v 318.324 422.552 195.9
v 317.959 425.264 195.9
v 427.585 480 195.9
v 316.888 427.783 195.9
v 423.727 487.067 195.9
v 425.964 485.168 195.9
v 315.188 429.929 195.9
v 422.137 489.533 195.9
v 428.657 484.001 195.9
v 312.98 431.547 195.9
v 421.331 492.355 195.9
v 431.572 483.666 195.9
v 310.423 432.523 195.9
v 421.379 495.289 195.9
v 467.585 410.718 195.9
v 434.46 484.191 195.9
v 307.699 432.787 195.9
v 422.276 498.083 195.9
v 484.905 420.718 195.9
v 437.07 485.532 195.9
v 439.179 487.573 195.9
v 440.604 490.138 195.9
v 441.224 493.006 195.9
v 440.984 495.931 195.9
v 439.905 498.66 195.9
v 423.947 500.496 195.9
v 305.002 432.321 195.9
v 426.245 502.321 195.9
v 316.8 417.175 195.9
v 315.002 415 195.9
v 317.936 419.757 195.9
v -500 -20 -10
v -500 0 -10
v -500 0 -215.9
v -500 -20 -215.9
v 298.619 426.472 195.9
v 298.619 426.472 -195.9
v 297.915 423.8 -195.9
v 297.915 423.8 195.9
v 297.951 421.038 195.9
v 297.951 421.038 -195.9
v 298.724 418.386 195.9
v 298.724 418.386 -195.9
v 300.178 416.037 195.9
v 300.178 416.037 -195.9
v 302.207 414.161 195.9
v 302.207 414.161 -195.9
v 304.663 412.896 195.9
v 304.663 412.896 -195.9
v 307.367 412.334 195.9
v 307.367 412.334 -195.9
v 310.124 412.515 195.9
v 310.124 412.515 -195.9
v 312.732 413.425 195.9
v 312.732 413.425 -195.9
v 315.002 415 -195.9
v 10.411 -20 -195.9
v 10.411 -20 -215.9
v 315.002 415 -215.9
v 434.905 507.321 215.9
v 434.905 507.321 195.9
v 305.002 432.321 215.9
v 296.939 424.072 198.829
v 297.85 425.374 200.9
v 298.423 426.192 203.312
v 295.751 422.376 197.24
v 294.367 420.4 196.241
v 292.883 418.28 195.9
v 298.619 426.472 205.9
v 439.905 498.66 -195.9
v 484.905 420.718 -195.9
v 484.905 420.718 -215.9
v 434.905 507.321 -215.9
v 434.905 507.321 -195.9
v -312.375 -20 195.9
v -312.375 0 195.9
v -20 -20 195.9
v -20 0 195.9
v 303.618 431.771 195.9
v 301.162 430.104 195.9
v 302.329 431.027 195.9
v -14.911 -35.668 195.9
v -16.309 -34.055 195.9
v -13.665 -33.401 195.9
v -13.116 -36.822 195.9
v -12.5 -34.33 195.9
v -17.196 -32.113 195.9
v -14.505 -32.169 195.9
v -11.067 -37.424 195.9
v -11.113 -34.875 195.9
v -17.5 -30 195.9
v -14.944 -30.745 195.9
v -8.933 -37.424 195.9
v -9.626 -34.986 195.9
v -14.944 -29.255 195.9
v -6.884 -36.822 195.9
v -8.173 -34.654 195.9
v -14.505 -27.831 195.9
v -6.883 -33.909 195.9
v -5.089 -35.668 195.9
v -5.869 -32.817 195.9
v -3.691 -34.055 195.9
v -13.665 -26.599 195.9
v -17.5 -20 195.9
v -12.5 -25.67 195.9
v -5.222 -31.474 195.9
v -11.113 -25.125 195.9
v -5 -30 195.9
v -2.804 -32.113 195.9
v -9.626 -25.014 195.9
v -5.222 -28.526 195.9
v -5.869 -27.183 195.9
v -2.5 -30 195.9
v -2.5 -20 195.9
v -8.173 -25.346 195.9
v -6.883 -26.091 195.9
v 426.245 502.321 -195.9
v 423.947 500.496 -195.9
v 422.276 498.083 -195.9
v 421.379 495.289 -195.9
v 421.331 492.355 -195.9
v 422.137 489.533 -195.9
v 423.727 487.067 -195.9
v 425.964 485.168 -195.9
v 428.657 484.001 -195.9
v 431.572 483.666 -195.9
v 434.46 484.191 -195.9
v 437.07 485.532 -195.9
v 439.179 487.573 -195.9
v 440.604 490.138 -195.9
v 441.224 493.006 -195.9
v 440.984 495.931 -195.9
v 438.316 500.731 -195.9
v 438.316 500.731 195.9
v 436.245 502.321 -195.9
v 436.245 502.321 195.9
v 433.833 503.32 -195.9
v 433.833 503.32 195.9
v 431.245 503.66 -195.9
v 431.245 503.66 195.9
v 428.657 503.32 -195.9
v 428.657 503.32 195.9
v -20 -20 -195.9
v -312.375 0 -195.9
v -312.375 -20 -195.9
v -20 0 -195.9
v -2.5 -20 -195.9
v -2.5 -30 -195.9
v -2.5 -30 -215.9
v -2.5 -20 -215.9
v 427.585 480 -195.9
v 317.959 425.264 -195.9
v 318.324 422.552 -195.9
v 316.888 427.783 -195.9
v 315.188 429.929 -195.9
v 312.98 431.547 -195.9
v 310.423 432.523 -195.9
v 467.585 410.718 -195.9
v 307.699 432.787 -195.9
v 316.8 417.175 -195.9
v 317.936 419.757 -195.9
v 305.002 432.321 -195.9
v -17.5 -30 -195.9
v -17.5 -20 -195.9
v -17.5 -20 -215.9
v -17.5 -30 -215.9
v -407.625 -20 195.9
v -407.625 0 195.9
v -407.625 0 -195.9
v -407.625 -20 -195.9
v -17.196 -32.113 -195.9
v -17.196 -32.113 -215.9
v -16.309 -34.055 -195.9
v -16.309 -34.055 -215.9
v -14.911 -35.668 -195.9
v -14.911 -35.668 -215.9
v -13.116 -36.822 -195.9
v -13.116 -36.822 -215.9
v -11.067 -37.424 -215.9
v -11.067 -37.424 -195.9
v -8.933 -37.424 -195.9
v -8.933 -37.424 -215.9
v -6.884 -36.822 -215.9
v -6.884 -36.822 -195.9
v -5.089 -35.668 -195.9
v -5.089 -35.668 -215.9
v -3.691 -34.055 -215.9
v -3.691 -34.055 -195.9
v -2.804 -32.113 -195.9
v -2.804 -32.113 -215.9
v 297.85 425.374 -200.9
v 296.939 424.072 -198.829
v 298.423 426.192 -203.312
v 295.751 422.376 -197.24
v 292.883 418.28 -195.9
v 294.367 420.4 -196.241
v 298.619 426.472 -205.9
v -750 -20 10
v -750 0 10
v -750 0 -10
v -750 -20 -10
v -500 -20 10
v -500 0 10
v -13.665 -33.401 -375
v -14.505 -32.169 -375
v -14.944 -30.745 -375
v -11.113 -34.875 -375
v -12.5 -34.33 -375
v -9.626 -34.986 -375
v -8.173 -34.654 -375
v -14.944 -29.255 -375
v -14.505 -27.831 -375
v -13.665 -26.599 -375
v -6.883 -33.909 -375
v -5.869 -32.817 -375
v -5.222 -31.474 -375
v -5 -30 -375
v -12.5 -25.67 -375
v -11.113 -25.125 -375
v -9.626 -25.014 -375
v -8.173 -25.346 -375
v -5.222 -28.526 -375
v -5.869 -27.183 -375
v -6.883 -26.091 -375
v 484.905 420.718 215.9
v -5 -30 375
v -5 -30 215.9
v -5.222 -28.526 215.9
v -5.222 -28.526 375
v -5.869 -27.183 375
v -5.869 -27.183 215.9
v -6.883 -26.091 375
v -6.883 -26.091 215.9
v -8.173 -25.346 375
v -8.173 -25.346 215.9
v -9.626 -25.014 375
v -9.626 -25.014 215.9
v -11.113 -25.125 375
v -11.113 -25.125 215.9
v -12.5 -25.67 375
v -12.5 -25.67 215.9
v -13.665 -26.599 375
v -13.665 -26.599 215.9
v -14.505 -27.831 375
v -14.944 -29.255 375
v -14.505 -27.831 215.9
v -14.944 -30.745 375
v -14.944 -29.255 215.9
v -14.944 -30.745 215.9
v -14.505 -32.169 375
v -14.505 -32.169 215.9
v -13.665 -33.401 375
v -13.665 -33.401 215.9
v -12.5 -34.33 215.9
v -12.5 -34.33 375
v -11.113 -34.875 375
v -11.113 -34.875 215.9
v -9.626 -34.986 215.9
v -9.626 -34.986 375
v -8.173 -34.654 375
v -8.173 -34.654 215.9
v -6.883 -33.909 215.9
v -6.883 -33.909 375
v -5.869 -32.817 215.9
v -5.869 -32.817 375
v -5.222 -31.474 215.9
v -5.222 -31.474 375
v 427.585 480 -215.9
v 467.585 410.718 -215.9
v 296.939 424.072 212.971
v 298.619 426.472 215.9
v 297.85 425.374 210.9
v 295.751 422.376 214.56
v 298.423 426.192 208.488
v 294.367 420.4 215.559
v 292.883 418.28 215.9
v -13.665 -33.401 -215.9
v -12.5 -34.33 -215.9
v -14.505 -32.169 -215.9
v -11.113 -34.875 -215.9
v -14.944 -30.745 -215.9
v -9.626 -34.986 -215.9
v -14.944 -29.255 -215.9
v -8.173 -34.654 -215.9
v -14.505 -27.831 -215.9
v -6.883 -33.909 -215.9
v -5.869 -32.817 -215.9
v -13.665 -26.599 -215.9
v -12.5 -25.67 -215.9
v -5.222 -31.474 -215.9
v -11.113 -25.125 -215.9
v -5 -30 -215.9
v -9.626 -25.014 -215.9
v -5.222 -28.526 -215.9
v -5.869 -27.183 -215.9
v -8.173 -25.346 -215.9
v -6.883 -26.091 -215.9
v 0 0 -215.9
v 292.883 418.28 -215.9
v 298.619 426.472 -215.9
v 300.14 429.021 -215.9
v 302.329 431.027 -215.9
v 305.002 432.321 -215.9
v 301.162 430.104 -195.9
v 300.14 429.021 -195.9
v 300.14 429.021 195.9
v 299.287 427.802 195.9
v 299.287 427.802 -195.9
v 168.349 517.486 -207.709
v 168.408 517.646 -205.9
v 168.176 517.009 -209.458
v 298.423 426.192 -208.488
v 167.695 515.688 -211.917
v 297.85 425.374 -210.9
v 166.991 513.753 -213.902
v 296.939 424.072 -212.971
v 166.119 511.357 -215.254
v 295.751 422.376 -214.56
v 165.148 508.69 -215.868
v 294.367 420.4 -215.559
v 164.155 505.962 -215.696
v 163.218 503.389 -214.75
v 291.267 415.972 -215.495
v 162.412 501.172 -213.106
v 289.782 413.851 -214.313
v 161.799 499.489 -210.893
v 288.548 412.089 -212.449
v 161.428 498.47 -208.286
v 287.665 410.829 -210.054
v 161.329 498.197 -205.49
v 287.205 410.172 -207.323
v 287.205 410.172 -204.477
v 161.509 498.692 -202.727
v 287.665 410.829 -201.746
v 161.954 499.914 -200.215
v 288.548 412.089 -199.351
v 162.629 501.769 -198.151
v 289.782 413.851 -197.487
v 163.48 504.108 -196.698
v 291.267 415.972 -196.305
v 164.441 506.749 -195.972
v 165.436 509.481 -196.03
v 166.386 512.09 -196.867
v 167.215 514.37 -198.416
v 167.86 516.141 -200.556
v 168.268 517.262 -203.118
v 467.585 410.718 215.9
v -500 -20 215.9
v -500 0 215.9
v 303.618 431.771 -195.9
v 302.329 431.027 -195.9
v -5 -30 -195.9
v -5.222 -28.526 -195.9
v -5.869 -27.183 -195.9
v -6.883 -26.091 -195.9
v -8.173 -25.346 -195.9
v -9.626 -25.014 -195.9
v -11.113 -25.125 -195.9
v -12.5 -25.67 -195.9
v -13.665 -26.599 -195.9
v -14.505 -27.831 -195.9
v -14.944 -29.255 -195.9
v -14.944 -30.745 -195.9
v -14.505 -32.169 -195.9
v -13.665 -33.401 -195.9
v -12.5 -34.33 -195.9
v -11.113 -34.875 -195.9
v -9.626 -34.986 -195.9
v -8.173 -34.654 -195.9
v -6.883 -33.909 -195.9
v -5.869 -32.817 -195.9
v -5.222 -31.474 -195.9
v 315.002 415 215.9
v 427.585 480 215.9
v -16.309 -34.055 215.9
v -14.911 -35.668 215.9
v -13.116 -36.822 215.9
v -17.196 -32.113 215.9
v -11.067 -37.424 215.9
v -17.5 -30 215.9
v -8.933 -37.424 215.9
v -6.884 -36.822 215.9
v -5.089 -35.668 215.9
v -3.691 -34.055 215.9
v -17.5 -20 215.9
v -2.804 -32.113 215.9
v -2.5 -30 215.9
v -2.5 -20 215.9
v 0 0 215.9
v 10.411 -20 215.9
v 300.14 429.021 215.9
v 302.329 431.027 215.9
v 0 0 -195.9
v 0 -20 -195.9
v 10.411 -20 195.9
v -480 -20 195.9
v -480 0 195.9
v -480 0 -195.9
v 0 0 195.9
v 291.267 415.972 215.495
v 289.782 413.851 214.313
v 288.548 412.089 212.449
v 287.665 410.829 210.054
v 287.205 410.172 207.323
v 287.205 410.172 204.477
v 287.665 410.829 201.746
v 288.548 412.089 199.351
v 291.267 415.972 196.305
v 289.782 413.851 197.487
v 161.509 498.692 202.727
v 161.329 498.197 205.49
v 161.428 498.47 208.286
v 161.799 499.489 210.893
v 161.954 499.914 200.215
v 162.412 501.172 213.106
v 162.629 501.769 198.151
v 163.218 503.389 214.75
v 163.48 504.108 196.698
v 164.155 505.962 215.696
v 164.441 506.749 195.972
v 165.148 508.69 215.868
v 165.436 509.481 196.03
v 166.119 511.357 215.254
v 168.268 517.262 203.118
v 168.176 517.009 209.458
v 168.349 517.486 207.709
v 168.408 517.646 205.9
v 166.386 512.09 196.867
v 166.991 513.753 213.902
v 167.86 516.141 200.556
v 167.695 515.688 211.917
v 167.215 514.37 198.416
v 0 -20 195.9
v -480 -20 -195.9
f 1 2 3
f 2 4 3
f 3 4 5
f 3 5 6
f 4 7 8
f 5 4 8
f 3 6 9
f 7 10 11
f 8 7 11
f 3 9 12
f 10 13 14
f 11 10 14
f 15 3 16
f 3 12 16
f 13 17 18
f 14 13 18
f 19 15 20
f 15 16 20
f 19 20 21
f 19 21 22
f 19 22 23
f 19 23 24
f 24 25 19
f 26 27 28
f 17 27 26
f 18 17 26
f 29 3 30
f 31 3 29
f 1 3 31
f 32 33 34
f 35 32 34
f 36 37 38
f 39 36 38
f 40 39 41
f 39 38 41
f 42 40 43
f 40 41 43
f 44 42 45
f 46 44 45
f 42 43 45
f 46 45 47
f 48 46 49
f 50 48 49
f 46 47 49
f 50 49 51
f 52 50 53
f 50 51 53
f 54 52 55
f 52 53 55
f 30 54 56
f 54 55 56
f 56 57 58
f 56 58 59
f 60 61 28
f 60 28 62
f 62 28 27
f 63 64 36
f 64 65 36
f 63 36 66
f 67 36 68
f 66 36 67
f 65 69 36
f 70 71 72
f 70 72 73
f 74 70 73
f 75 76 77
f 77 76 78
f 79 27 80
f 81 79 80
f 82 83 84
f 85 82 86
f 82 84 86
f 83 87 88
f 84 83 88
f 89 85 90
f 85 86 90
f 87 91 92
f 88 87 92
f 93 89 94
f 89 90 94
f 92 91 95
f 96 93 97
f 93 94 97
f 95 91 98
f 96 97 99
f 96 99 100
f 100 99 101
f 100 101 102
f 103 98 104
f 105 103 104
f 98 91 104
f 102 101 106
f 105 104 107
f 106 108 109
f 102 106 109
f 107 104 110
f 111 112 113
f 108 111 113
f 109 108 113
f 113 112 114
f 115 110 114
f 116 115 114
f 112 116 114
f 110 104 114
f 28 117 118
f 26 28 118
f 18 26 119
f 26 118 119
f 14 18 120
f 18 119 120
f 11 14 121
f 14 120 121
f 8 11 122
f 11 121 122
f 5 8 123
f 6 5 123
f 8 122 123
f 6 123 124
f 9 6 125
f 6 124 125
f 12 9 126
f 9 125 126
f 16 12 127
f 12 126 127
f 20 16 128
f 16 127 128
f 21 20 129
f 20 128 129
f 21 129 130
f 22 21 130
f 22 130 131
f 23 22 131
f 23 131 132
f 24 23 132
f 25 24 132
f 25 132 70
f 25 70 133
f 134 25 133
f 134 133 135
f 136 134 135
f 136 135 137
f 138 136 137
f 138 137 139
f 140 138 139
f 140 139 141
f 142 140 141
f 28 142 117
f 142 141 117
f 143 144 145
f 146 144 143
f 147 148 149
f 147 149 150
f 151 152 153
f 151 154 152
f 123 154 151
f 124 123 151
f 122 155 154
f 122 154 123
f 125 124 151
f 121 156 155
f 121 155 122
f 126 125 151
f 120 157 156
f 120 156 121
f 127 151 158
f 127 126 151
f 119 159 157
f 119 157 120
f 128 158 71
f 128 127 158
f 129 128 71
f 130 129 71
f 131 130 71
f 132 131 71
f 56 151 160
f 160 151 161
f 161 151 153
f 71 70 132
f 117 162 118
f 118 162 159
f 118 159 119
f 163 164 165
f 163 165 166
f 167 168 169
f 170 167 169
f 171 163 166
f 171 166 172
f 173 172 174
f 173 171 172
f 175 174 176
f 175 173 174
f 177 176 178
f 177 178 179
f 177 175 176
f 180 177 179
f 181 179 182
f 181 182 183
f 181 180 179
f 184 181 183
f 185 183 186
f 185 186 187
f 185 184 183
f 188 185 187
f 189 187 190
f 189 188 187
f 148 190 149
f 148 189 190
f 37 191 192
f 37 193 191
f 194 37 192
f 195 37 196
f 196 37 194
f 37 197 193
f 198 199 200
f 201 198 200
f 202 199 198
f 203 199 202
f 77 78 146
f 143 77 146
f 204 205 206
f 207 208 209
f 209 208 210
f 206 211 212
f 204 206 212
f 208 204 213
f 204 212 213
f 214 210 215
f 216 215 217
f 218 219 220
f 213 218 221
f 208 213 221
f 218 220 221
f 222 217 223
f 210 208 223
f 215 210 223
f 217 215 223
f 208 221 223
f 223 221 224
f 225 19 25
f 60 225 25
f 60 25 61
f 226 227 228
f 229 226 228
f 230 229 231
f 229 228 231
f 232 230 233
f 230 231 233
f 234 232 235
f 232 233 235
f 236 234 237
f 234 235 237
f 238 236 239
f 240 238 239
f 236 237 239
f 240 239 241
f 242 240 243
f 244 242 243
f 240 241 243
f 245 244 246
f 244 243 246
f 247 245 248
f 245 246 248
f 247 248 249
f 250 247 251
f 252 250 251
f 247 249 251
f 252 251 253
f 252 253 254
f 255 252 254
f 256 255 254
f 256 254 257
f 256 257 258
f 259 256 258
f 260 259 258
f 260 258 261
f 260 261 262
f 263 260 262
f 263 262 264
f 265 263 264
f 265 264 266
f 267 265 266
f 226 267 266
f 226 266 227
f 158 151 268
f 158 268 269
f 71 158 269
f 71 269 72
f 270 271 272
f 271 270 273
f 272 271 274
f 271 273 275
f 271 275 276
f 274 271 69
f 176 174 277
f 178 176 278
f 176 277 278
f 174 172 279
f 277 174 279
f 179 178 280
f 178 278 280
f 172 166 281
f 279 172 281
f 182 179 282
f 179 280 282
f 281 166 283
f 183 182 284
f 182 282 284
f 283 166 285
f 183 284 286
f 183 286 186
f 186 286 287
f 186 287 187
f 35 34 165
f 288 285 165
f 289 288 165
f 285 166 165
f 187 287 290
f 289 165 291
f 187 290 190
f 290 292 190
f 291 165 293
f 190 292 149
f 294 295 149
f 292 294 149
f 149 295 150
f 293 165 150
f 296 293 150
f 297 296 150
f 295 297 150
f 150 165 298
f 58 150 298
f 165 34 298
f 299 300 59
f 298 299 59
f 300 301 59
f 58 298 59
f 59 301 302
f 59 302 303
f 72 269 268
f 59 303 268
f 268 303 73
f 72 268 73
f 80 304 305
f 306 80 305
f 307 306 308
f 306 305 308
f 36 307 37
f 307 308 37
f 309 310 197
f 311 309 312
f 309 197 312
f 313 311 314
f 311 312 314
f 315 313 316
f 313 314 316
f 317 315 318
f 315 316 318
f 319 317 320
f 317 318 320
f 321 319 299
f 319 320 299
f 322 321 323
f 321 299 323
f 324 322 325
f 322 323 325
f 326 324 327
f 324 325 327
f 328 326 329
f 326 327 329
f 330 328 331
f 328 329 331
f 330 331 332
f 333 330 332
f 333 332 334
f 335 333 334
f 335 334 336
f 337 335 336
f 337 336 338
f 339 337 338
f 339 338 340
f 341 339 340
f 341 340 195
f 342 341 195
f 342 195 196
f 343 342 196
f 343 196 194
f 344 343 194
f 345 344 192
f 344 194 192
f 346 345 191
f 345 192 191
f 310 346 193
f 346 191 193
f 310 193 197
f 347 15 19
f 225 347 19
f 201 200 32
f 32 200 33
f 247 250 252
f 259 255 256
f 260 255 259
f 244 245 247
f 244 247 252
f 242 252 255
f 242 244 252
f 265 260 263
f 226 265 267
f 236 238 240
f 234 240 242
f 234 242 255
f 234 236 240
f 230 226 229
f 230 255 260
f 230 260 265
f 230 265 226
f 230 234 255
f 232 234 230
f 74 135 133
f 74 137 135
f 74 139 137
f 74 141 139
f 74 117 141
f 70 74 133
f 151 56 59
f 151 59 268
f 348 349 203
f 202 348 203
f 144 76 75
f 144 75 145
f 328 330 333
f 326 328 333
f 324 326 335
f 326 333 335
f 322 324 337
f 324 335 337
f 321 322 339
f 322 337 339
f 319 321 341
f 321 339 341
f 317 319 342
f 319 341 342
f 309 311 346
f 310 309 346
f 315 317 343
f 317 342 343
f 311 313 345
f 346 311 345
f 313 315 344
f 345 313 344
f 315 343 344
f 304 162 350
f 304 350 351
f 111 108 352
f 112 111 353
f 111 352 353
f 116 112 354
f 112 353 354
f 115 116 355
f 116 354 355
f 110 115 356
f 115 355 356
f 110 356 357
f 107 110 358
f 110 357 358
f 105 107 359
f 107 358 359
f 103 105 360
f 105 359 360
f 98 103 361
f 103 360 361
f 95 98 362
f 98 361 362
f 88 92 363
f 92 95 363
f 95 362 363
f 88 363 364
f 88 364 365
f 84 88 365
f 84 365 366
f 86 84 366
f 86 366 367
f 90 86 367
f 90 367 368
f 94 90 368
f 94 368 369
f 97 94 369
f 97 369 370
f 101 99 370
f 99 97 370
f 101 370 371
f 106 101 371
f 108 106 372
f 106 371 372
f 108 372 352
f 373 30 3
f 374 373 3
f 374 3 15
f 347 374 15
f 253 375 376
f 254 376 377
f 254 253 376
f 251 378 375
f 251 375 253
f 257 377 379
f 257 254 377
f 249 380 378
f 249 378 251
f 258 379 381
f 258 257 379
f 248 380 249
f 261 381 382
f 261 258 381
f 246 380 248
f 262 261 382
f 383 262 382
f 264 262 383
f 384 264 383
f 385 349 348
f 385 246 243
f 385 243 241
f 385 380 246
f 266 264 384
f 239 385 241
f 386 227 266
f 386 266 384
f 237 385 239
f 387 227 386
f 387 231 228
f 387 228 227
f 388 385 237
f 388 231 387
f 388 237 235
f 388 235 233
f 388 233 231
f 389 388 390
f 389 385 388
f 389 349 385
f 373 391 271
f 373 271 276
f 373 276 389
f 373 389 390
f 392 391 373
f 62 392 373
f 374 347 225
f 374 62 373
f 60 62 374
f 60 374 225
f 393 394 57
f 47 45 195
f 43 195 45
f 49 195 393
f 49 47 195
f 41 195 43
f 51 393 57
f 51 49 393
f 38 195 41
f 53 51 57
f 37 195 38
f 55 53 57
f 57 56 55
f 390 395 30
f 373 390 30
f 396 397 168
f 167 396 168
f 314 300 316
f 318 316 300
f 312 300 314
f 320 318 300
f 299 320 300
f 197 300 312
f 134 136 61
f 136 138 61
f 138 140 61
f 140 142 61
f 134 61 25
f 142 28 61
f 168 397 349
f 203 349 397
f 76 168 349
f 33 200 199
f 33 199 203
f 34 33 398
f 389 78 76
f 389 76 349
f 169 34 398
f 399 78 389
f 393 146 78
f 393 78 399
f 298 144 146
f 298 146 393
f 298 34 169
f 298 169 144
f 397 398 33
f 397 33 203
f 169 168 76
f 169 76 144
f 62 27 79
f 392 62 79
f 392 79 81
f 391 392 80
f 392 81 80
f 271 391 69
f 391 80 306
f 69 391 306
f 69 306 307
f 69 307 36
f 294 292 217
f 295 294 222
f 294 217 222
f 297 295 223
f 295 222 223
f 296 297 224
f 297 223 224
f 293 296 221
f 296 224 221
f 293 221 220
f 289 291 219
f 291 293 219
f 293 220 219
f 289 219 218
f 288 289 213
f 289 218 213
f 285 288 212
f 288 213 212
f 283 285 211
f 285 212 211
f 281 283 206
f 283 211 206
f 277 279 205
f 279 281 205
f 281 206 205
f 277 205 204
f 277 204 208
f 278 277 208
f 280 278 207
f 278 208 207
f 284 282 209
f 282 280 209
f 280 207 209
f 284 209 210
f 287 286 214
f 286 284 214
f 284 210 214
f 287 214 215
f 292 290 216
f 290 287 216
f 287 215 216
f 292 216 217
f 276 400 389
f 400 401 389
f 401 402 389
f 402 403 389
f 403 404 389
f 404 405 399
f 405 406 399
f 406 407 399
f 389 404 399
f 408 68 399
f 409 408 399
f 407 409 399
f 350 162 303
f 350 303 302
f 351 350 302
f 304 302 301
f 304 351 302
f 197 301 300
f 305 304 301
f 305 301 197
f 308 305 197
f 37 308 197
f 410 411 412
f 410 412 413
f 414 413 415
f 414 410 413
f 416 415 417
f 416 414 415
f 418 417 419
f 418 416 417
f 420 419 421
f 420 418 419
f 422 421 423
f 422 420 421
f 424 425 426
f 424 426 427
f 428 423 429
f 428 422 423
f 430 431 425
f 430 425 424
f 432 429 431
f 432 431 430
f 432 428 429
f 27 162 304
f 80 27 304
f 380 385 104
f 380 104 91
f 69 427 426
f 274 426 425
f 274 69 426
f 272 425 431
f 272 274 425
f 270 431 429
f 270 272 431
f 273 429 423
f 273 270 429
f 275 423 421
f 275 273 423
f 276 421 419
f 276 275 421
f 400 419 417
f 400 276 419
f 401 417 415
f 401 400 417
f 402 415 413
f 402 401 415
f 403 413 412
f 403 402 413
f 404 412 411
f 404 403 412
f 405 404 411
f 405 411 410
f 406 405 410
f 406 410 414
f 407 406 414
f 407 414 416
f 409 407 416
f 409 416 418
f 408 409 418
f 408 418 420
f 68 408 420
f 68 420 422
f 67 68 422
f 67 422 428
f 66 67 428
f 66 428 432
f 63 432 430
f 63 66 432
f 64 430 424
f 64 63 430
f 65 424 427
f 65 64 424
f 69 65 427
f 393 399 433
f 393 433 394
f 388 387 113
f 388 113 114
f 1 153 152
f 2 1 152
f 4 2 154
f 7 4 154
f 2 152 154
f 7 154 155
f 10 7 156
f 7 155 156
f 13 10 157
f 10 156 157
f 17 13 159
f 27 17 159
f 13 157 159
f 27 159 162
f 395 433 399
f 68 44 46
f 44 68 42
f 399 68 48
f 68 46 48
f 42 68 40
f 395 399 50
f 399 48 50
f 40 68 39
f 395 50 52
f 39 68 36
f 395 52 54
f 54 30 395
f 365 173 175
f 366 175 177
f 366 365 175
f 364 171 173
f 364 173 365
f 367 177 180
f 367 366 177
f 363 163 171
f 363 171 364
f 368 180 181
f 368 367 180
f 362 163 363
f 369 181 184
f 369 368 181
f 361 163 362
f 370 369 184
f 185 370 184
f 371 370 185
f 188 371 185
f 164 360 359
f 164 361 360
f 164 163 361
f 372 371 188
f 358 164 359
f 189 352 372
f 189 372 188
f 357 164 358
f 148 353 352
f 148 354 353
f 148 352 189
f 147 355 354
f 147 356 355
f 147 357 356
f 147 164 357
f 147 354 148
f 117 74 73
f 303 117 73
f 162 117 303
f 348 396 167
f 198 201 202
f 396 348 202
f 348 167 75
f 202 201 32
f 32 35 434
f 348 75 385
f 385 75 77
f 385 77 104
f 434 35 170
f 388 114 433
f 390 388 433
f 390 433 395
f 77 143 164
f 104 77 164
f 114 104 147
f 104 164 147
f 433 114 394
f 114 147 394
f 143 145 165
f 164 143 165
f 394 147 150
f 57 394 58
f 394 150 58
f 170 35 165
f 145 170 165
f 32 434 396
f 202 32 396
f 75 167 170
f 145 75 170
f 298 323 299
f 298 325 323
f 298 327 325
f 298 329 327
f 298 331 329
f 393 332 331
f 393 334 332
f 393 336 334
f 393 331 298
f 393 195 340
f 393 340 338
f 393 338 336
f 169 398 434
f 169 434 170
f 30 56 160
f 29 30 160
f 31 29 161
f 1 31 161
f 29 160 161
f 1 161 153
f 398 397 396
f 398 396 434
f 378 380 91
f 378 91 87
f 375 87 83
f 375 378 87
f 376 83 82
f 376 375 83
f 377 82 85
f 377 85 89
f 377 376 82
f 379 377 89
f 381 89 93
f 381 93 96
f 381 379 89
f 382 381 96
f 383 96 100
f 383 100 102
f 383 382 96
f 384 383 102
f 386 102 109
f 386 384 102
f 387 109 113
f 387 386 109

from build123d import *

# Parameters (mm, degrees)
SKETCH6_W                       = 500
SKETCH6_H                       = 431.8
SKETCH6_W_2                     = 460
SKETCH6_H_2                     = 391.8
SKETCH6_W_3                     = 95.25
SKETCH6_W_4                     = 250
SKETCH6_H_3                     = 20
BOSS_EXTRUDE2_DEPTH             = 20
BOSS_EXTRUDE6_START             = -195.9
SKETCH8_R                       = 5
BOSS_EXTRUDE6_DEPTH             = 20
BOSS_EXTRUDE7_START             = 215.9
SKETCH8_6_R                     = 5
BOSS_EXTRUDE7_DEPTH             = 20
BOSS_EXTRUDE8_REACH             = 783.357
SKETCH8_7_R                     = 5
BOSS_EXTRUDE8_DIRECTION_2_REACH = 783.357
BOSS_EXTRUDE9_START             = -195.9
BOSS_EXTRUDE9_DEPTH             = 20
BOSS_EXTRUDE10_START            = 195.9
BOSS_EXTRUDE10_DEPTH            = 20
BOSS_EXTRUDE11_START            = 179.1
SKETCH8_8_R                     = 5
BOSS_EXTRUDE11_DEPTH            = 195.9
BOSS_EXTRUDE12_START            = -375
SKETCH8_9_R                     = 5
BOSS_EXTRUDE12_DEPTH            = 195.9
BOSS_EXTRUDE13_START            = -195.9
BOSS_EXTRUDE13_DEPTH            = 391.8
BOSS_EXTRUDE14_START            = -195.9
BOSS_EXTRUDE14_DEPTH            = 391.8
BOSS_EXTRUDE15_START            = -195.9
SKETCH9_6_R                     = 10
BOSS_EXTRUDE15_DEPTH            = 391.8
BOSS_EXTRUDE16_REACH            = 982.051
SKETCH10_R                      = 10


# Read off the part's stored shape, not the designer's step: Boss-Extrude10, Boss-Extrude14
with BuildPart() as part:
    # Sketch6 → Boss-Extrude2 (new body)
    # profile 1 of 3: a face of its own
    with BuildSketch(Plane(origin=(0, 0, 0), x_dir=(1, 0, 0), z_dir=(0, 1, 0))):
        with Locations((-250, 0)):
            Rectangle(SKETCH6_W, SKETCH6_H)
        with Locations((-250, 0)):
            Rectangle(SKETCH6_W_2, SKETCH6_H_2, mode=Mode.SUBTRACT)
    # profile 2 of 3: a face of its own
    with BuildSketch(Plane(origin=(0, 0, 0), x_dir=(1, 0, 0), z_dir=(0, 1, 0))):
        with Locations((-360, 0)):
            Rectangle(SKETCH6_W_3, SKETCH6_H_2)
    # profile 3 of 3: a face of its own
    with BuildSketch(Plane(origin=(0, 0, 0), x_dir=(1, 0, 0), z_dir=(0, 1, 0))):
        with Locations((-625, 0)):
            Rectangle(SKETCH6_W_4, SKETCH6_H_3)
    extrude(amount=-BOSS_EXTRUDE2_DEPTH)

    # Sketch8 → Boss-Extrude6 (add)
    # profile 1 of 2: a face of its own
    with BuildSketch(Plane.XY.offset(BOSS_EXTRUDE6_START)):
        with BuildLine():
            Line((-2.5, -30), (-2.5, -20))
            Line((-2.5, -20), (-17.5, -20))
            Line((-17.5, -20), (-17.5, -30))
            ThreePointArc((-17.5, -30), (-10, -37.5), (-2.5, -30))
        make_face()
        with Locations((-10, -30)):
            Circle(SKETCH8_R, mode=Mode.SUBTRACT)
    # profile 2 of 2: a face of its own
    with BuildSketch(Plane.XY.offset(BOSS_EXTRUDE6_START)):
        with Locations((-10, -30)):
            Circle(SKETCH8_R)
    extrude(amount=-BOSS_EXTRUDE6_DEPTH)

    # Sketch8<6> → Boss-Extrude7 (add)
    # profile 1 of 2: a face of its own
    with BuildSketch(Plane.XY.offset(BOSS_EXTRUDE7_START)):
        with BuildLine():
            Line((-2.5, -30), (-2.5, -20))
            Line((-2.5, -20), (-17.5, -20))
            Line((-17.5, -20), (-17.5, -30))
            ThreePointArc((-17.5, -30), (-10, -37.5), (-2.5, -30))
        make_face()
        with Locations((-10, -30)):
            Circle(SKETCH8_6_R, mode=Mode.SUBTRACT)
    # profile 2 of 2: a face of its own
    with BuildSketch(Plane.XY.offset(BOSS_EXTRUDE7_START)):
        with Locations((-10, -30)):
            Circle(SKETCH8_6_R)
    extrude(amount=-BOSS_EXTRUDE7_DEPTH)

    # Boss-Extrude8: up to this face of the body (flat: up to its plane)
    boss_extrude8_end = Plane(part.part.faces().sort_by_distance((-166.1875, -10, 195.9))[0])
    # Sketch8<7> → Boss-Extrude8 (add, up to the picked face)
    with BuildSketch(Plane.XY, mode=Mode.PRIVATE) as boss_extrude8_sk1:
        with Locations((-10, -30)):
            Circle(SKETCH8_7_R)
    boss_extrude8_tool1 = split(extrude(boss_extrude8_sk1.sketch, amount=BOSS_EXTRUDE8_REACH, mode=Mode.PRIVATE), bisect_by=boss_extrude8_end, keep=Keep.BOTH, mode=Mode.PRIVATE)
    add(boss_extrude8_tool1.solids().sort_by(Axis((-10, -30, 0), (0, 0, 1)))[0])

    # Boss-Extrude8 direction 2: up to this face of the body (flat: up to its plane)
    boss_extrude8_direction_2_end = Plane(part.part.faces().sort_by_distance((-443.8125, -10, -195.9))[0])
    # Sketch8<7> → Boss-Extrude8 direction 2 (add, up to the picked face)
    with BuildSketch(Plane.XY, mode=Mode.PRIVATE) as boss_extrude8_direction_2_sk1:
        with Locations((-10, -30)):
            Circle(SKETCH8_7_R)
    boss_extrude8_direction_2_tool1 = split(extrude(boss_extrude8_direction_2_sk1.sketch, amount=-BOSS_EXTRUDE8_DIRECTION_2_REACH, mode=Mode.PRIVATE), bisect_by=boss_extrude8_direction_2_end, keep=Keep.BOTH, mode=Mode.PRIVATE)
    add(boss_extrude8_direction_2_tool1.solids().sort_by(Axis((-10, -30, 0), (0, 0, -1)))[0])

    # Sketch9 → Boss-Extrude9 (add)
    with BuildSketch(Plane.XY.offset(BOSS_EXTRUDE9_START)):
        with BuildLine():
            Line((298.618579246, 426.471528727), (0, 0))
            Line((0, 0), (0, -20))
            Line((0, -20), (10.411341011, -20))
            Line((10.411341011, -20), (315.001620132, 415))
            Line((315.001620132, 415), (427.584922624, 480))
            Line((427.584922624, 480), (467.584922624, 410.717967697))
            Line((467.584922624, 410.717967697), (484.9054307, 420.717967697))
            Line((484.9054307, 420.717967697), (434.9054307, 507.320508076))
            Line((434.9054307, 507.320508076), (305.001620132, 432.320508076))
            ThreePointArc((305.001620132, 432.320508076), (301.161755938, 430.103561449), (298.618579246, 426.471528727))
        make_face()
    extrude(amount=-BOSS_EXTRUDE9_DEPTH)

    # Boss-Extrude10 outline → Boss-Extrude10 (add)
    with BuildSketch(Plane.XY.offset(BOSS_EXTRUDE10_START)):
        with BuildLine():
            Line((434.9054307, 507.320508076), (305.001620132, 432.320508076))
            ThreePointArc((305.001620132, 432.320508076), (301.161755938, 430.103561449), (298.618579246, 426.471528727))
            Line((298.618579246, 426.471528727), (0, 0))
            Line((0, 0), (0, -20))
            Line((0, -20), (10.411341011, -20))
            Line((10.411341011, -20), (315.001620132, 415))
            Line((315.001620132, 415), (427.584922624, 480))
            Line((427.584922624, 480), (467.584922624, 410.717967697))
            Line((467.584922624, 410.717967697), (484.9054307, 420.717967697))
            Line((484.9054307, 420.717967697), (434.9054307, 507.320508076))
        make_face()
    extrude(amount=BOSS_EXTRUDE10_DEPTH)

    # Sketch8<8> → Boss-Extrude11 (add)
    with BuildSketch(Plane.XY.offset(BOSS_EXTRUDE11_START)):
        with Locations((-10, -30)):
            Circle(SKETCH8_8_R)
    extrude(amount=BOSS_EXTRUDE11_DEPTH)

    # Sketch8<9> → Boss-Extrude12 (add)
    with BuildSketch(Plane.XY.offset(BOSS_EXTRUDE12_START)):
        with Locations((-10, -30)):
            Circle(SKETCH8_9_R)
    extrude(amount=BOSS_EXTRUDE12_DEPTH)

    # Boss-Extrude14 outline → Boss-Extrude14 (add)
    with BuildSketch(Plane.XY.offset(BOSS_EXTRUDE14_START)):
        with BuildLine():
            ThreePointArc((301.161755938, 430.103561449), (313.203085607, 413.681259926), (305.001620132, 432.320508076))
            Line((305.001620132, 432.320508076), (301.161755938, 430.103561449))
        make_face()
    extrude(amount=BOSS_EXTRUDE14_DEPTH)

    # Sketch9<6> → Boss-Extrude15 (add)
    with BuildSketch(Plane.XY.offset(BOSS_EXTRUDE15_START)):
        with Locations(Location((431.245176662, 493.660254038, 0), (0, 0, 120))):
            Circle(SKETCH9_6_R)
    extrude(amount=BOSS_EXTRUDE15_DEPTH)


with BuildPart() as body_2:
    # Sketch9<4> → Boss-Extrude13 (new body)
    with BuildSketch(Plane.XY.offset(BOSS_EXTRUDE13_START)):
        with BuildLine():
            Line((301.161755938, 430.103561449), (298.618579246, 426.471528727))
            ThreePointArc((298.618579246, 426.471528727), (302.206662098, 414.161374144), (315.001620132, 415))
            ThreePointArc((315.001620132, 415), (317.457036008, 418.426528886), (318.324483178, 422.551780725))
            ThreePointArc((318.324483178, 422.551780725), (314.138351629, 430.8120276), (305.001620132, 432.320508076))
            Line((305.001620132, 432.320508076), (301.161755938, 430.103561449))
        make_face()
    extrude(amount=BOSS_EXTRUDE13_DEPTH)


    add(part.part)  # Boss-Extrude16 merges part
    # Boss-Extrude16: up to this plane
    boss_extrude16_end = Plane(origin=(-17.660444431, 6.427876097, 0), z_dir=(0.939692620785907, -0.3420201433256725, 0))
    # Sketch10 → Boss-Extrude16 (add, up to the surface)
    with BuildSketch(Plane(origin=(0, 0, 0), x_dir=(0, 0, 1), z_dir=(-0.8191520442889914, 0.5735764363510468, 0)), mode=Mode.PRIVATE) as boss_extrude16_sk1:
        with Locations(Location((-205.9, 510.6256051, 0), (0, 0, 90))):
            Circle(SKETCH10_R)
    boss_extrude16_tool1 = split(extrude(boss_extrude16_sk1.sketch, amount=BOSS_EXTRUDE16_REACH, mode=Mode.PRIVATE), bisect_by=boss_extrude16_end, keep=Keep.BOTH, mode=Mode.PRIVATE)
    boss_extrude16 = boss_extrude16_tool1.solids().sort_by_distance((292.882815, 418.280008, -205.9))[0]
    add(boss_extrude16)

    # Mirror1: Boss-Extrude16 across plane
    add(boss_extrude16.mirror(Plane.XY))


solid = body_2.part
